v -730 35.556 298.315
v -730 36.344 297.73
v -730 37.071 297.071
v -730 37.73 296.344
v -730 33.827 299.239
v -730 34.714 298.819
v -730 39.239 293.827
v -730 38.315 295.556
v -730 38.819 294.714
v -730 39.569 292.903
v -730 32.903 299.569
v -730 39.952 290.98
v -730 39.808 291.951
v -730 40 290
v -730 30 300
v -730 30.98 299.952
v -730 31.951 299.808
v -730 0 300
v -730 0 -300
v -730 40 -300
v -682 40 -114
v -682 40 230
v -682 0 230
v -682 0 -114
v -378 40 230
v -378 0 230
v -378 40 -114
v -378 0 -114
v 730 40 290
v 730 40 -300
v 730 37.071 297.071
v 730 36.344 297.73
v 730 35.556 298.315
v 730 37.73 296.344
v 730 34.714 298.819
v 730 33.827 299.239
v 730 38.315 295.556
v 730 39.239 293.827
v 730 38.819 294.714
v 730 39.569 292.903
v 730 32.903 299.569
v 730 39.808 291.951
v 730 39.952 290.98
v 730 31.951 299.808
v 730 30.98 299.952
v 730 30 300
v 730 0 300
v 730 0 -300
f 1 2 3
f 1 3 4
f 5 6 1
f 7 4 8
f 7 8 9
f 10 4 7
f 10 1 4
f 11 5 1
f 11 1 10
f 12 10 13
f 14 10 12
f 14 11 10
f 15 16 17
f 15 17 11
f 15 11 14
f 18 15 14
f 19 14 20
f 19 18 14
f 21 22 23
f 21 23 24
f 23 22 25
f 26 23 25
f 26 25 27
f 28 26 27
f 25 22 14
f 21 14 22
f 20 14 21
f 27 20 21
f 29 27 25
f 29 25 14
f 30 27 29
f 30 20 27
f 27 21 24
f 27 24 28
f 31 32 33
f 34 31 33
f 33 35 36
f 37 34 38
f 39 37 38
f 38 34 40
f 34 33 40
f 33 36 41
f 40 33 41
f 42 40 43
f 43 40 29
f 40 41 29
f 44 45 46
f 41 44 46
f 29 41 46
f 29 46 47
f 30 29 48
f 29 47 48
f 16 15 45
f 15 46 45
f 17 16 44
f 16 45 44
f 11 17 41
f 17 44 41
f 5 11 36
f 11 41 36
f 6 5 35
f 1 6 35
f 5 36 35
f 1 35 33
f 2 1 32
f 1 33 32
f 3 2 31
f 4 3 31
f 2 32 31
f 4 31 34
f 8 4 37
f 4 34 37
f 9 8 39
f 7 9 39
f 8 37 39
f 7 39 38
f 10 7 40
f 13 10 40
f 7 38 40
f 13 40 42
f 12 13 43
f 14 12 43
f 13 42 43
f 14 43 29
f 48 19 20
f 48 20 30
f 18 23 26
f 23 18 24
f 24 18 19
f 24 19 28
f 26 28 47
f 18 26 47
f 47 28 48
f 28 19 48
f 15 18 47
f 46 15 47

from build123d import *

# Parameters (mm, degrees)
SKETCH1_W           = 1460
SKETCH1_H           = 600
BOSS_EXTRUDE1_DEPTH = 40
FILLET1_R           = 10
CUT_EXTRUDE1_REACH  = 792.253
SKETCH2_W           = 304
SKETCH2_H           = 344


with BuildPart() as part:
    # Sketch1 → Boss-Extrude1 (new body)
    with BuildSketch(Plane(origin=(0, 0, 0), x_dir=(1, 0, 0), z_dir=(0, 1, 0))):
        Rectangle(SKETCH1_W, SKETCH1_H)
    extrude(amount=BOSS_EXTRUDE1_DEPTH)

    # Fillet1
    fillet1_edges = [part.edges().sort_by_distance(p)[0] for p in [
        (0, 40, 300),
    ]]
    fillet(fillet1_edges, radius=FILLET1_R)

    # Sketch2 → Cut-Extrude1 (cut, up to next)
    with BuildSketch(Plane(origin=(0, 40, 0), x_dir=(1, 0, 0), z_dir=(0, 1, 0)), mode=Mode.PRIVATE) as cut_extrude1_sk1:
        with Locations((-530, -58)):
            Rectangle(SKETCH2_W, SKETCH2_H)
    cut_extrude1_tool1 = extrude(cut_extrude1_sk1.sketch, amount=-CUT_EXTRUDE1_REACH, mode=Mode.PRIVATE) & part.part
    add(cut_extrude1_tool1.solids().sort_by_distance((-530, 40, 58))[0], mode=Mode.SUBTRACT)


solid = part.part
